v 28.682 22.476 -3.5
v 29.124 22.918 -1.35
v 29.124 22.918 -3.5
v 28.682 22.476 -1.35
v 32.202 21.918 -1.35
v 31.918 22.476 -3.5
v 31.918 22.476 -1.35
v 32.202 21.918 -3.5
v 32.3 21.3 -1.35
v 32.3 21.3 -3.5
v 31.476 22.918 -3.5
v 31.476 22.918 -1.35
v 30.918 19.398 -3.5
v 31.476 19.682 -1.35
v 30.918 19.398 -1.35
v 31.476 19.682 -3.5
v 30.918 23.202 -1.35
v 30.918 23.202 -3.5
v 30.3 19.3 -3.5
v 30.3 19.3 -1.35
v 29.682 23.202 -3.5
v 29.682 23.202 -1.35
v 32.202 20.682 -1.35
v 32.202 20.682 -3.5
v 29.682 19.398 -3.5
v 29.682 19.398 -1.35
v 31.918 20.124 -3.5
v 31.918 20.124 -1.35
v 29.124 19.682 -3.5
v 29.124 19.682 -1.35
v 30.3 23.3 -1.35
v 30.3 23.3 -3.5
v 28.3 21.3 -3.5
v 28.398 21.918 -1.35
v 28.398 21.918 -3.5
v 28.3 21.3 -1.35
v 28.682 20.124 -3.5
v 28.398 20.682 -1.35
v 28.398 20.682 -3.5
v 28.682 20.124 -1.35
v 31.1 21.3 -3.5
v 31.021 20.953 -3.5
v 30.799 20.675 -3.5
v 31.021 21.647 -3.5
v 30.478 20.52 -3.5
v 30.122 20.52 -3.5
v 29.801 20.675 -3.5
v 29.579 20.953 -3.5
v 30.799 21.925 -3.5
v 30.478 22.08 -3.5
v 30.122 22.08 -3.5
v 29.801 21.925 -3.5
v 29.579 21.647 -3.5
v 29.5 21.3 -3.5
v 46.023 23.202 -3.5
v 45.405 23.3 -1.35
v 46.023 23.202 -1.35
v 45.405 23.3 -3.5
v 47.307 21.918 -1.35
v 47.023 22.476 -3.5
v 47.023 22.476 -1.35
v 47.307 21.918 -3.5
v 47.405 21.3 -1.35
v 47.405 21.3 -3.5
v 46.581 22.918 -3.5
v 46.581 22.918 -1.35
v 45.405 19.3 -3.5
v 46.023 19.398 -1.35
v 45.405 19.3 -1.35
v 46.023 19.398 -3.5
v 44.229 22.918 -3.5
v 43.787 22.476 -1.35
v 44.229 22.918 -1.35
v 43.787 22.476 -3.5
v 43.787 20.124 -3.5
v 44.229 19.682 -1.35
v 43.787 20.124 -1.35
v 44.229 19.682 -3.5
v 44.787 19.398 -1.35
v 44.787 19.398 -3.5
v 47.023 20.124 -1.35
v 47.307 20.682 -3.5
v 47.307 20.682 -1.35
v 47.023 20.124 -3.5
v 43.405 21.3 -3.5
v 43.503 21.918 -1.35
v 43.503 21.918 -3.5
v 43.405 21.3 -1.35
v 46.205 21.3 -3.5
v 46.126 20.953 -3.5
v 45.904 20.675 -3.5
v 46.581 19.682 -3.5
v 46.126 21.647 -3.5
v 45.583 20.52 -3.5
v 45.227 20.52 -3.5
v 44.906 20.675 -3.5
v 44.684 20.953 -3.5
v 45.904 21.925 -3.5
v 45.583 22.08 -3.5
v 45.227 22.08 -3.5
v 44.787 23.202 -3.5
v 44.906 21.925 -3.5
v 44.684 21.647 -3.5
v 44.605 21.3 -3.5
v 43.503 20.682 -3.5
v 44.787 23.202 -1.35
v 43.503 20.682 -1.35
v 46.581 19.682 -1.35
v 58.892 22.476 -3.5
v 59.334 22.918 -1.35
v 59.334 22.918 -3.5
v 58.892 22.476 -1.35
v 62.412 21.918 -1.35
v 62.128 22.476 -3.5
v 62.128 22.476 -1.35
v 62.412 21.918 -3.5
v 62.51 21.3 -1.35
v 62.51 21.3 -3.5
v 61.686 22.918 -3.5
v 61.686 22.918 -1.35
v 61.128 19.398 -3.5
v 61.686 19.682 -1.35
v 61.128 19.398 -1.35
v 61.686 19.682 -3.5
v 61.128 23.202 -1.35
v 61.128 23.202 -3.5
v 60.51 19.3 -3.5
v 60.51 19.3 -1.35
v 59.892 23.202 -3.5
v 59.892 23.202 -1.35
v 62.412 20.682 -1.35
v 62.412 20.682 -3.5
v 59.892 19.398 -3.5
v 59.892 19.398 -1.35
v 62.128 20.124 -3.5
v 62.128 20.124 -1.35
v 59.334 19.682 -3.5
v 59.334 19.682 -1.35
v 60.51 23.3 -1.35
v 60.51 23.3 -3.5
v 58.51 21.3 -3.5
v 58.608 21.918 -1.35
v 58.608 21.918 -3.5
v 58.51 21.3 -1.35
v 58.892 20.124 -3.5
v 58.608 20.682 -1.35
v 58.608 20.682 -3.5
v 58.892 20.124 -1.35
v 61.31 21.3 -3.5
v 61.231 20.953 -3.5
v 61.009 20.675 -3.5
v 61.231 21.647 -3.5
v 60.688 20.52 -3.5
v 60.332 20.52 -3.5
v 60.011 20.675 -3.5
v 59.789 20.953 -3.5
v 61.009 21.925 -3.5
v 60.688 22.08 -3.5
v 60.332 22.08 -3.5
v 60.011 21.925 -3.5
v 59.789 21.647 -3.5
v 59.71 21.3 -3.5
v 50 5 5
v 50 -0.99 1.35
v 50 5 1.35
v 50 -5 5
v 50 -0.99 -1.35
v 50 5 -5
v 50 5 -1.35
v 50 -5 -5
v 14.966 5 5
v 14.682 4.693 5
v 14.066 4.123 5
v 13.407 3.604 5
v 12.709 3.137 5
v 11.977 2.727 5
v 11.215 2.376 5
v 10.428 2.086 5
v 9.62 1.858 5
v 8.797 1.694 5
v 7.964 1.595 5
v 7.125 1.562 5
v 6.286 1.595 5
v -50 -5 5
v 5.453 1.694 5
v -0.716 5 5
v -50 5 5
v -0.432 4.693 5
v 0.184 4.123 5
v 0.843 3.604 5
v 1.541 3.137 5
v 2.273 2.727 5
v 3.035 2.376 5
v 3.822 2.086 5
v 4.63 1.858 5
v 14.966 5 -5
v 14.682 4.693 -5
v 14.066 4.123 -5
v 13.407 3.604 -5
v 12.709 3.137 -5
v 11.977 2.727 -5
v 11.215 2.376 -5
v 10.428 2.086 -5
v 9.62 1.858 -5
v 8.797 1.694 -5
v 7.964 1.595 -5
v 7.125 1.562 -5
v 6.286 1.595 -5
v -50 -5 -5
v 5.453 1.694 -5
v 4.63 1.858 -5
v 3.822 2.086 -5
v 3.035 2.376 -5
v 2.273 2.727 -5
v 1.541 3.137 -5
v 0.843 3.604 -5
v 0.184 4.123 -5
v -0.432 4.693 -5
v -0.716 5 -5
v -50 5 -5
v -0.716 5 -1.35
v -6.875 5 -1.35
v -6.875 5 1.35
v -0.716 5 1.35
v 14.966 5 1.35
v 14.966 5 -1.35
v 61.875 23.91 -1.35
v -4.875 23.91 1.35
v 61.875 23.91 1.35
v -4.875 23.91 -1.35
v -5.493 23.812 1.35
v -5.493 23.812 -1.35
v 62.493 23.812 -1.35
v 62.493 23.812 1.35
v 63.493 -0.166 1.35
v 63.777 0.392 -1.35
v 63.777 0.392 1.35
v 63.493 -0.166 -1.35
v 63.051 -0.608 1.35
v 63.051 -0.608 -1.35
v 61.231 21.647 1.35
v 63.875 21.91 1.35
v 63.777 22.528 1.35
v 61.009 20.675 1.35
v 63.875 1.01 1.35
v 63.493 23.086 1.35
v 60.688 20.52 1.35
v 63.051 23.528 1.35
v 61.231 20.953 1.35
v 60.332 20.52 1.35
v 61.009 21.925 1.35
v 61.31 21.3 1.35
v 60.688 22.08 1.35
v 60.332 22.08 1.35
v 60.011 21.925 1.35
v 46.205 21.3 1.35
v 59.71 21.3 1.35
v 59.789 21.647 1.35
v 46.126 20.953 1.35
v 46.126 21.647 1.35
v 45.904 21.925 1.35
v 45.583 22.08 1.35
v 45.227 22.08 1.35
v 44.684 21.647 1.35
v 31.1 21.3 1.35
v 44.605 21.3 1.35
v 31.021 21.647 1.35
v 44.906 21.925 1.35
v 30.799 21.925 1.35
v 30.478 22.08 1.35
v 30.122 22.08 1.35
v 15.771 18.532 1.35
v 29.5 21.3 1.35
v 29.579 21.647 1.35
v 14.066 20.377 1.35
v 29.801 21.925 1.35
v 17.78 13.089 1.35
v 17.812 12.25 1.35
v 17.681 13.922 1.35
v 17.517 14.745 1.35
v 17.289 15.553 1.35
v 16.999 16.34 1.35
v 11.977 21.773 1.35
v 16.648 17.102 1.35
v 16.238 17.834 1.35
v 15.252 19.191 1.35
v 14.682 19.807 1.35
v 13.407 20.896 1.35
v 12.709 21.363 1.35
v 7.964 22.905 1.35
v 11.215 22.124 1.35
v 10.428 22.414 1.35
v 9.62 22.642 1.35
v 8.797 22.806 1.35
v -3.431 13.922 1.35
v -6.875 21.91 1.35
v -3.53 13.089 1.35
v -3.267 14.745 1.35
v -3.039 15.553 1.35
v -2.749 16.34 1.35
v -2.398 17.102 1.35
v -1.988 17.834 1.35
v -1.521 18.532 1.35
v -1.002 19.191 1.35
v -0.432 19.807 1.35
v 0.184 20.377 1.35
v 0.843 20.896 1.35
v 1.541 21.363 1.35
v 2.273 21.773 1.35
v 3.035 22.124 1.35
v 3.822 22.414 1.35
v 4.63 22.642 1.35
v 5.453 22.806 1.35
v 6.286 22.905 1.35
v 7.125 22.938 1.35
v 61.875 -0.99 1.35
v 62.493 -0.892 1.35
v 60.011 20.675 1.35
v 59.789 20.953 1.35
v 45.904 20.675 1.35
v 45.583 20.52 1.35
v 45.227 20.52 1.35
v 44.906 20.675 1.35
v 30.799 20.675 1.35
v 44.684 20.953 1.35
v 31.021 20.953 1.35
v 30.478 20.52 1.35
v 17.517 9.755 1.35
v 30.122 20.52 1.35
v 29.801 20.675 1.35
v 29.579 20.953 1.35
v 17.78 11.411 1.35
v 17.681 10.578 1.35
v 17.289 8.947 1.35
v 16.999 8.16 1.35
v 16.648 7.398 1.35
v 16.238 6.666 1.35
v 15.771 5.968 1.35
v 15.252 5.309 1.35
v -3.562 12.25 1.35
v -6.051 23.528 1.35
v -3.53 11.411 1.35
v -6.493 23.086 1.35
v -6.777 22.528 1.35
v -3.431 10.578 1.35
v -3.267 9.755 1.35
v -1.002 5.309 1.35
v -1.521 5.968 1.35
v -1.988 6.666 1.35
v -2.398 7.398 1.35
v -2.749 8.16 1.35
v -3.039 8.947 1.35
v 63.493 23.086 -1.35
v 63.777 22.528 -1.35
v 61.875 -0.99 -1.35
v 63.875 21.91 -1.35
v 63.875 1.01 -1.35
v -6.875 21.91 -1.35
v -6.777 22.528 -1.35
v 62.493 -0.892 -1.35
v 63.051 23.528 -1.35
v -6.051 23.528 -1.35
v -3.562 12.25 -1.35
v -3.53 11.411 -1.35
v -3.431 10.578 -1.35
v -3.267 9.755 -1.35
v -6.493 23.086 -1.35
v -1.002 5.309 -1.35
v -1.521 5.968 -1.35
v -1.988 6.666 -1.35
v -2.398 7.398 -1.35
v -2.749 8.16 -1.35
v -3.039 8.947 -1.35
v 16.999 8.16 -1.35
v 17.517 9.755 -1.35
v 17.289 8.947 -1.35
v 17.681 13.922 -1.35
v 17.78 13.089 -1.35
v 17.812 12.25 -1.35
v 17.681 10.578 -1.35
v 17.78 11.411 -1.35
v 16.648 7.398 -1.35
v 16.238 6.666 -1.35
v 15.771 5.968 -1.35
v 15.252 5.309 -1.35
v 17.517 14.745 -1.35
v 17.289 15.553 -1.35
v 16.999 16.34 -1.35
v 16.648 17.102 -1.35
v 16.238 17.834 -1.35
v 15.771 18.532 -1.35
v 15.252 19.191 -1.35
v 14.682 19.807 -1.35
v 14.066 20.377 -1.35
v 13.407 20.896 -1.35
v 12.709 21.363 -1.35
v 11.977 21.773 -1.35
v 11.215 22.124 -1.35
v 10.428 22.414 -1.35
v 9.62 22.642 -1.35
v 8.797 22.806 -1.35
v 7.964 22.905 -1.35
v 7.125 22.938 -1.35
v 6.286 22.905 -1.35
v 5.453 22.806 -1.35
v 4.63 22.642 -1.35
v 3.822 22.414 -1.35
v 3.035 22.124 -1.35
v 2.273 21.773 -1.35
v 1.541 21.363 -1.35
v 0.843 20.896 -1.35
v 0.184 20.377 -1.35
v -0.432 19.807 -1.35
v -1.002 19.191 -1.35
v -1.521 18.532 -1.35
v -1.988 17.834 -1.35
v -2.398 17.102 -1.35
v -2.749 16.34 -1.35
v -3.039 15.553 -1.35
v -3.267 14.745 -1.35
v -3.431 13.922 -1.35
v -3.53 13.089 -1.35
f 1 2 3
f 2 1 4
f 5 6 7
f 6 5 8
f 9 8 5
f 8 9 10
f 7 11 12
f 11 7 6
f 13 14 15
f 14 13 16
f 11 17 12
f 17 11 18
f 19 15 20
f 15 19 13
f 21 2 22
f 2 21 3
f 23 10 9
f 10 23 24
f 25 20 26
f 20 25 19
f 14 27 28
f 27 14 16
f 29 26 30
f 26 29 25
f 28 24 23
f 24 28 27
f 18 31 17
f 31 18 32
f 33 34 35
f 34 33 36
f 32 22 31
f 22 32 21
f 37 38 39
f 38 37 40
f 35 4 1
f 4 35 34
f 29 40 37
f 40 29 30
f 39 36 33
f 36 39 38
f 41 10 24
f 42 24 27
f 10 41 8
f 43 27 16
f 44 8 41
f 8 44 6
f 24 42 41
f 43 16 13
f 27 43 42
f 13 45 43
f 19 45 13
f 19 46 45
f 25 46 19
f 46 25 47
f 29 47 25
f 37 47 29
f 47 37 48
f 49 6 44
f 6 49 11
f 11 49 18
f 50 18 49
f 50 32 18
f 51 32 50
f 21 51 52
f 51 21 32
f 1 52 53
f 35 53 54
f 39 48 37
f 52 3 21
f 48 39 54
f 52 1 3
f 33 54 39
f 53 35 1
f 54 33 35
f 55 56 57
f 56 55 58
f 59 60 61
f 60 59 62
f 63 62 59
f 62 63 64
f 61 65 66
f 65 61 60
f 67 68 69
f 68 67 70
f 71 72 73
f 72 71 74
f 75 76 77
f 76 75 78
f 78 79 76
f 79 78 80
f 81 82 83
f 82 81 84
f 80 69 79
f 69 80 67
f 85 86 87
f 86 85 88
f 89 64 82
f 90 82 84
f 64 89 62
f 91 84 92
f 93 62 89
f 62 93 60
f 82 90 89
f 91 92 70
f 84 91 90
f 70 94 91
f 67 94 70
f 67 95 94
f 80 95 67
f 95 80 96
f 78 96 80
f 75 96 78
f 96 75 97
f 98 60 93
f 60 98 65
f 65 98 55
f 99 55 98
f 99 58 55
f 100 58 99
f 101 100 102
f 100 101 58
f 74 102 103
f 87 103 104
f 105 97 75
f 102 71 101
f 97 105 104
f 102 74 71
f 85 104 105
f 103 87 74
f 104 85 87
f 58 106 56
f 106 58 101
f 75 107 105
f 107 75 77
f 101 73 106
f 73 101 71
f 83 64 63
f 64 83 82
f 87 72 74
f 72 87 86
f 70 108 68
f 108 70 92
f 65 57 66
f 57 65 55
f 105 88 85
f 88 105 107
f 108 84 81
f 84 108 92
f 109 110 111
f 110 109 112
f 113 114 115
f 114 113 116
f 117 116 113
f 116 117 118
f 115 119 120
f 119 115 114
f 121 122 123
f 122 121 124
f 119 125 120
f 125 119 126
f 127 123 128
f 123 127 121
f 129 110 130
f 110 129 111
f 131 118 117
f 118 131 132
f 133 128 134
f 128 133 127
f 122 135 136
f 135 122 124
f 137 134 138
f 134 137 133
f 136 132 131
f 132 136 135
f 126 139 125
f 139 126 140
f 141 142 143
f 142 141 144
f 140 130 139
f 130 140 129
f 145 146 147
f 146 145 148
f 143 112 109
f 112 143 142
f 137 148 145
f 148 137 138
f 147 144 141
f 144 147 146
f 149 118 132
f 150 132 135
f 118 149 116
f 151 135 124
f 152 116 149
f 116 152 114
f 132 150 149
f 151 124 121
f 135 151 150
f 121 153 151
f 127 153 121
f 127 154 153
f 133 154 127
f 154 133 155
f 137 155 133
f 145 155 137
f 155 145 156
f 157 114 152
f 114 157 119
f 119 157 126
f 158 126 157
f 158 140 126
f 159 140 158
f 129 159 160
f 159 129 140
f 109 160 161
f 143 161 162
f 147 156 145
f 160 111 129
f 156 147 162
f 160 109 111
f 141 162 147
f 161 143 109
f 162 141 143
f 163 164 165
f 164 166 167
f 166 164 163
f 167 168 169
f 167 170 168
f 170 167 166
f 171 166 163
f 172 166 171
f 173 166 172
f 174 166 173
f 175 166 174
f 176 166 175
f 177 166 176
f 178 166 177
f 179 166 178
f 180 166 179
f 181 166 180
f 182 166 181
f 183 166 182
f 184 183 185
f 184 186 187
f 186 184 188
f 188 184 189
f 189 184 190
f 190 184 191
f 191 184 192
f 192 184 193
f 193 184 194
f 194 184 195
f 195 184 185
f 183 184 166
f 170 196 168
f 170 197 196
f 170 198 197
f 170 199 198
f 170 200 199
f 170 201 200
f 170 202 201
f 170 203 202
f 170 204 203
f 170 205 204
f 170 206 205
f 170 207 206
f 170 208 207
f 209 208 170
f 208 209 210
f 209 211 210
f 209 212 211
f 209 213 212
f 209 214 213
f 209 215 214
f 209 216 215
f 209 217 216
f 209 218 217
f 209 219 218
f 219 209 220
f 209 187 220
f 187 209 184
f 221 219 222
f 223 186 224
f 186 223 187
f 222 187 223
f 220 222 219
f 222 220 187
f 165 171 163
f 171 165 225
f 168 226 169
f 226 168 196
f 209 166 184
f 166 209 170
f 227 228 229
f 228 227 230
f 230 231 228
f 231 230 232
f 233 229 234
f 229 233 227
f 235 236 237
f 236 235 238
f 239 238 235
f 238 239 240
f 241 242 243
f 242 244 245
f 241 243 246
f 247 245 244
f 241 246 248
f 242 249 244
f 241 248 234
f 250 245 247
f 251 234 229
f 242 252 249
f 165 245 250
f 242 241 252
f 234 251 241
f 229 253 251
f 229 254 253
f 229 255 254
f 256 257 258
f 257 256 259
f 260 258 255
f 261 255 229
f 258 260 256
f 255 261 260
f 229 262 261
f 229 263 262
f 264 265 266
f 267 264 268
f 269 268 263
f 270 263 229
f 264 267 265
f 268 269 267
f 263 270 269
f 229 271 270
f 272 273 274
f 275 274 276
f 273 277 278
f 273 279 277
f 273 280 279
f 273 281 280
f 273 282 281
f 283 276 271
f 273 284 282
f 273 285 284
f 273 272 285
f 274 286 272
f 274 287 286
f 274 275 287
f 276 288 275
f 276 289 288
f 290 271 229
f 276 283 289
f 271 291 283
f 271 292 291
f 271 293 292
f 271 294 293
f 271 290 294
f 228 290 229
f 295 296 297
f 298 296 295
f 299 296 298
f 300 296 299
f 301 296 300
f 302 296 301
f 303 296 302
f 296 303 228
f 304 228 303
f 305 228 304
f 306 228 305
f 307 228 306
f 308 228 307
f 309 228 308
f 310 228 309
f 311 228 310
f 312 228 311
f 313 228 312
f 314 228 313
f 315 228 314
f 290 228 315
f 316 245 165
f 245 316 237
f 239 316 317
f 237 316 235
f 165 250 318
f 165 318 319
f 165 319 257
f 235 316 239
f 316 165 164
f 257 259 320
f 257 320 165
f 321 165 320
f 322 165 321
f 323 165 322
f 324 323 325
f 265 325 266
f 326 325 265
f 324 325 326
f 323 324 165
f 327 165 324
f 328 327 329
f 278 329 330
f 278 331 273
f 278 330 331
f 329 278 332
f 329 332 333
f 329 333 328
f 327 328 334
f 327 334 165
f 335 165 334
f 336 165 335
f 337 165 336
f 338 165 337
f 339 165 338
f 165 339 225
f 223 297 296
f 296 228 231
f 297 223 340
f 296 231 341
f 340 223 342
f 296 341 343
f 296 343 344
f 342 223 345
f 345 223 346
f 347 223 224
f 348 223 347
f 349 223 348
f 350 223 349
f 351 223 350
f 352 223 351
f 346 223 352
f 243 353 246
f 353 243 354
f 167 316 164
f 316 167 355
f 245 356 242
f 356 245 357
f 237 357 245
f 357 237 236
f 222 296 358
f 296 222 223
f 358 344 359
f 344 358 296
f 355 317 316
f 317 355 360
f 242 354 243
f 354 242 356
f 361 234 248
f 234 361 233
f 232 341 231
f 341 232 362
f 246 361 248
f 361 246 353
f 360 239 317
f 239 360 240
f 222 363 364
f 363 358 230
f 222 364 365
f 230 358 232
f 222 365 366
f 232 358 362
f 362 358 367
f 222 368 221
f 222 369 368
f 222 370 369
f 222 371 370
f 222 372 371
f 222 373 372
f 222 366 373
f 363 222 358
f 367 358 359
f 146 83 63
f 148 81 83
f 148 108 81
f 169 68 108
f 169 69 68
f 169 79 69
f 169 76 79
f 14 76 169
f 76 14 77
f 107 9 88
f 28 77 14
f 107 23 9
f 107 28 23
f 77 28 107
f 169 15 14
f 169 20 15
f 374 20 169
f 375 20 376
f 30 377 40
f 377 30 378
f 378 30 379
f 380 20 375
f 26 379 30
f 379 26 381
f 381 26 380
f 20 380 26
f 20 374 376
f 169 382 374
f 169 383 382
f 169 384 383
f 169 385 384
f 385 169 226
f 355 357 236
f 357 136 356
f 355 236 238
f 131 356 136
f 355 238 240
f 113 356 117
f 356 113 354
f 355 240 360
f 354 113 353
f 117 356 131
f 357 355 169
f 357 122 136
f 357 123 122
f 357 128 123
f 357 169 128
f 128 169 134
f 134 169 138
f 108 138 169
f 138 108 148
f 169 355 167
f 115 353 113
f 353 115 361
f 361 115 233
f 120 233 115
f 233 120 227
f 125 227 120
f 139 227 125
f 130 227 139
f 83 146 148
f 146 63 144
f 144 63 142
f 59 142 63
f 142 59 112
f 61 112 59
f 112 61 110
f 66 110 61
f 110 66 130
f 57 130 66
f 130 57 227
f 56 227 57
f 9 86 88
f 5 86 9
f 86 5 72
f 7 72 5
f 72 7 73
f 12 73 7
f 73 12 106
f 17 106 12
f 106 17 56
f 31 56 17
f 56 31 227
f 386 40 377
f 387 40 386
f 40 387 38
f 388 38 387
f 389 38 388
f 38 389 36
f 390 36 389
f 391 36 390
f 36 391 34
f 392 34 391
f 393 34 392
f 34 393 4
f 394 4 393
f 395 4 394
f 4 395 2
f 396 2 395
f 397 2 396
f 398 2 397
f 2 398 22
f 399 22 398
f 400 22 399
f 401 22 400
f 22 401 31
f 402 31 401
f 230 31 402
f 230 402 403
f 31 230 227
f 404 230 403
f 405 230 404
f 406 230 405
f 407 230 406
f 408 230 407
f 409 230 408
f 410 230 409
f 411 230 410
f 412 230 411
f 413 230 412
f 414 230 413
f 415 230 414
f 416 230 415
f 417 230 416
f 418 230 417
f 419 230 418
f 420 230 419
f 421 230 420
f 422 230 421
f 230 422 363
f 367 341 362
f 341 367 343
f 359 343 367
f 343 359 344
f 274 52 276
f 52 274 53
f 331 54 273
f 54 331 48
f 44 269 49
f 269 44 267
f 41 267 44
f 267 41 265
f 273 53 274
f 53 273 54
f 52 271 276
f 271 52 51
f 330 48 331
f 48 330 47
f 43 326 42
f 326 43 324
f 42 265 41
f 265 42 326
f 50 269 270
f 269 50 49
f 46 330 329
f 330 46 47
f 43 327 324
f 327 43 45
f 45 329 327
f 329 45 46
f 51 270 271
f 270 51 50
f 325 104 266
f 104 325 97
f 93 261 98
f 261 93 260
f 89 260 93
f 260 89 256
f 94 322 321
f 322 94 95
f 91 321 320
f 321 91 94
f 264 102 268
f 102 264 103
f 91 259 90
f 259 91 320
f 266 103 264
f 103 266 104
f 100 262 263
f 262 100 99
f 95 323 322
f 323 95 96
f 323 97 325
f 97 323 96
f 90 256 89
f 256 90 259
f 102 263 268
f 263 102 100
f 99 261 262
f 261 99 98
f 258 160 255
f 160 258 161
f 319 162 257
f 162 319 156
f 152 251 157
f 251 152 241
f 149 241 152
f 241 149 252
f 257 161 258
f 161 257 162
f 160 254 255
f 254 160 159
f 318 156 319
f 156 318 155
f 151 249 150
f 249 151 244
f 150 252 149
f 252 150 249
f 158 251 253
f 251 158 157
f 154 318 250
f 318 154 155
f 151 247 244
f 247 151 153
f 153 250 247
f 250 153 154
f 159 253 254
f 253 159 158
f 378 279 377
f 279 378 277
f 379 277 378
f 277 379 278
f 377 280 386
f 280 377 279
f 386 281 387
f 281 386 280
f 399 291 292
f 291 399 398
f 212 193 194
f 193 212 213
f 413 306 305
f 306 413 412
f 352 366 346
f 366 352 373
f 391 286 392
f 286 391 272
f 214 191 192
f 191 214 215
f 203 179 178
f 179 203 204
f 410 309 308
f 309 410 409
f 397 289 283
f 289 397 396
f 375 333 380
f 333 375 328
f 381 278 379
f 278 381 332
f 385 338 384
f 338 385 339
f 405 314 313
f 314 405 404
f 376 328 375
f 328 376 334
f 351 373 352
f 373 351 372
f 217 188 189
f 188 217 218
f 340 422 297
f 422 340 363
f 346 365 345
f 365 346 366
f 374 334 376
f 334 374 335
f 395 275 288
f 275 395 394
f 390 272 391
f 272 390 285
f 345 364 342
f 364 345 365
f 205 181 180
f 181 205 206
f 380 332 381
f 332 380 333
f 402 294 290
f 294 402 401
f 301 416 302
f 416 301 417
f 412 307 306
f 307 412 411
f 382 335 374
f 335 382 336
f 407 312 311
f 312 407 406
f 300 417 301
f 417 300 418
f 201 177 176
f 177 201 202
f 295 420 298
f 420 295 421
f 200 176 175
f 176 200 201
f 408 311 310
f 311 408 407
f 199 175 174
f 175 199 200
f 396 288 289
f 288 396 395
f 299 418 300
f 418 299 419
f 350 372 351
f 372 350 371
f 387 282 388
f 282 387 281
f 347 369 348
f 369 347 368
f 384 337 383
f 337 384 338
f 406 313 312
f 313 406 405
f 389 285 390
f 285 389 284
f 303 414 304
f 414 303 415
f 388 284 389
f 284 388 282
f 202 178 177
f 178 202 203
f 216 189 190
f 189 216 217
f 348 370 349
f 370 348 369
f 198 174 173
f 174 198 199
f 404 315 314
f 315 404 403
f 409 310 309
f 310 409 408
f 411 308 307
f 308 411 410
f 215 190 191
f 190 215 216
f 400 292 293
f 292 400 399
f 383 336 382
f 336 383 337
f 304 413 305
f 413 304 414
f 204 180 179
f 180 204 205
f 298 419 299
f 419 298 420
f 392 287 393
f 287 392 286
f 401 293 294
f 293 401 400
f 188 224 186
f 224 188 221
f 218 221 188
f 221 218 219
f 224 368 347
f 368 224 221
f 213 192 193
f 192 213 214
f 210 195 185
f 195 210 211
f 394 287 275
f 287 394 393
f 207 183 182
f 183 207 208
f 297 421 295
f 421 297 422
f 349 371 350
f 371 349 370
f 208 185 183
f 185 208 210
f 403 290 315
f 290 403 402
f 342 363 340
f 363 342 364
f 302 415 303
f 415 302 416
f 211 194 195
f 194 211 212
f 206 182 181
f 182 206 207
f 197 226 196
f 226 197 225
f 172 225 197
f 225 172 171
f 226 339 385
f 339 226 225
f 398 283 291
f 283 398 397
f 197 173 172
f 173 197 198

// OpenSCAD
// collection of parts for the new picker idea

airflow = 57;
sleeveout = airflow+1;

// [fullOD, shaftD, thickness, turning_hubD]
hubbearing = [22,8,7,13];
travelbearing = [6,3,2.5,5];
travelwheel = 60;
travelpeg = travelwheel - travelbearing[1];

fat     = 0.3;  // add-on to make walls cut out enough space
hb      = 12.7 + fat; // height of bar cross-section
wthk    = 1.5 + fat;  // thickness of walls
flrthk  = 1.6 + fat;  // thickness of floor (that walls extend from)
inside  = 6.9 - fat;  // between walls, across floor (subtracting 2*.5*fat)
c_bar = [[0,0], [0,hb], [wthk, hb], [wthk, flrthk], [wthk+inside, flrthk], [wthk+inside, hb], [wthk+inside+wthk, hb], [wthk+inside+wthk, 0]];

//#shaft(travelbearing);
//#cbar(barH=100);
//#can_sleeve();
//translate([50,50,0])
//    for (i=[0:3:360]){
//        nutbolt(nut_position=20*i/360, channel_ang=i);
//    }
//bigwheel_part();
// bartest();

// ** the can traveler by itself ***
//rotate([0,0,180]) translate([0, -56, +25.9])
    //upndown();    

//motorcut();
//cbar();

rackpush();

// ** the main picker body ** 
//cbracket();

// ** the valve parts **
//louvers();

//plate_air_parts();
           

// for cutting out shaft and hub-turning space
module shaft(bearing, xtraH=0, hubclearance=0.5){
    height=bearing[2] + xtraH;
    translate([0,0,-height/2-hubclearance/2])
        cylinder(r=bearing[3]/2, h=hubclearance, center=true, $fn=28);
    translate([0,0,0])
        cylinder(r=bearing[1]/2, h=height, center=true, $fn=24);
    translate([0,0,height/2+hubclearance/2])
        cylinder(r=bearing[3]/2, h=hubclearance, center=true, $fn=28);
    echo("shaft of bearing = ", bearing, "is top-to-bottom = ", hubclearance*2 + height);
} 

// alluminum c-channel, positive or negative
module cbar(outline=c_bar, barH=50){
    midbar = outline[7][0] / 2;
    echo("midbar read as: ",midbar);
    translate([-midbar,0,0])
    linear_extrude(center=true, height=barH, convexity=10, slices=2)
        polygon(points=outline);
}

// intended as positive model, could add scale or thickness
module can_sleeve (emptyness=airflow, thickness=sleeveout-airflow-0.2, sleeveH=25){
    translate([0,0,-sleeveH/2])
        rotate_extrude($fn=196)
            translate([(emptyness+thickness) / 2, 0, 0])
                polygon(points=[[0,0], [0,sleeveH], [thickness,sleeveH], [thickness,0]]);
}

// negative model with channel for captured nut insertion
module nutbolt(hexhead=6.65, 
                shaftD=3.1, 
                shaftlen=20, 
                nut_position=17,
                nut_thick=2.33,  
                channel_len=30, 
                channel_ang=0,){
    color( .5, .9, .9 )
    translate([0,0,-shaftlen/2]){  //center it by shaftlen
        //shaft
        cylinder(r=shaftD/2, h=shaftlen, center=false, $fn=18);
        //head
        #translate([0,0,shaftlen-hexhead/2])
        cylinder(r=hexhead/2, h=hexhead/2, center=false, $fn=6);
        //nut + channel
        translate([0,0,shaftlen-nut_position])
        hull(){
        rotate([0,0,channel_ang])
            cylinder(r=hexhead/2+.1, h=nut_thick+.1, center=false, $fn=6);
        translate([cos(channel_ang)*channel_len, 
                    sin(channel_ang)*channel_len, 0])
            rotate([0,0,channel_ang])
                cylinder(r=hexhead/2+.2, h=nut_thick+.1, center=false, $fn=6);
        }
    }
}

module motorhub(flat_to_flat=4.76, diameter=7.4, height=5.57, baseD=9, baseH=1.0){
    cutrad = (diameter - flat_to_flat)/2;
    cutcenter = flat_to_flat/2 + cutrad;
    cylinder(r=baseD/2, h=baseH+0.1, center=false, $fn=36);
    cylinder(r=0.8, h=baseH+5*height+.1, center=true, $fn=6);
    translate([0,0,baseH])
        difference(){
            cylinder(r=diameter/2, h=height+baseH, center=false, $fn=24);
            for (i=[cutcenter+0.05, -cutcenter-0.05]){
                translate([0,i,(height+baseH)/2])
                    cube([diameter+0.1, cutrad+0.1, height+.1], center=true);
            }

        }
}
    
module bigwheel_part(od=travelwheel, thk=4, hub=12, hubthk=4, holes=6, lever=5){
    overall_thk = thk+hubthk;
    echo("overall bigwheel thickness is : ", overall_thk);
    difference(){
        union(){
            cylinder(r=od/2, h=thk, $fn=196);
            translate([0,0,4])
            cylinder(r=hub/2, h=hubthk, $fn=64);
        }
        translate([0,0,overall_thk+0.05]) rotate([180,0,0])
            motorhub();
        for (i=[0 : 360/holes : 360-(360/holes)*.5]){
            translate([od/3.14*cos(i), od/3.14*sin(i), hubthk/2])
                cylinder(r=od*.5/(holes-1), h=hubthk+.1, center=true, $fn=42);
        }
        translate([0,od/2-lever,-9]) rotate([0,0,0])
            nutbolt();
        translate([0,-od/2+lever,-9]) rotate([0,0,0])
            nutbolt();
    }
}

module ring(ID, OD, ht){
    difference(){
        cylinder(r=OD/2, h=ht, center=true, $fn=96);
        cylinder(r=ID/2, h=ht+.1, center=true, $fn=96);
    }
}

// for LMB8MM
module bearingcut(D=15.1/2, dring=14.41/2, drod=8.9/2, dziptie=[19,3.3],){
    rotate_extrude(center=true, convexity=10, $fn=36){
        polygon(points=[[0,-2], [D,0], 
                        [D,3.3], [dring,3.3], 
                        [dring,4.55], [D,4.55], 
                        [D,19.35], [dring,19.35], 
                        [dring,20.8], [D,20.8], 
                        [D, 24.01], [0,26.01]]);
    }
    // zip tie rings
    for (i=[(3.3+4.55)/2, (19.35+20.8)/2]){
        translate([0,0,i])
            ring(dziptie[0], dziptie[0]+dziptie[1], 5);
    }
    // rod upon which it travels
    translate([0,0,12])
        cylinder(r=drod, h=90, $fn=18, center=true);
}

module bigwheel_cutout(od=travelwheel+3, thk=10){
    cylinder(r=od/2, h=thk, $fn=128);
}

module bartest(ht=10){
    difference(){
    minkowski(){
        cube([20,20,10], center=true);
        cylinder(r=4, h=.1, center=true, $fn=24);
    }
    translate([-7,-9,0])
        #cbar(barH=30);
    translate([17,0,0]) rotate([0,0,90])
        #cbar(barH=30);
    translate([0,10.5,0]) rotate([90,0,0])
        #shaft(hubbearing);
    }
}

module upndown(ht=travelwheel){
    difference(){
    cube([travelwheel, travelwheel/2, ht], center=true);
    // lift rail
    translate([0, travelwheel/2-hb, 0])
        cube([travelwheel+.1, hb+.1, c_bar[6][0]+.1], center=true);
    // side rails
    translate([-travelwheel/2+.5 ,3.25, 0]) rotate([0,0,-0])
        cube([hb+.5, c_bar[6][0]+1, travelwheel+.1], center=true);
    translate([travelwheel/2-.5 ,3.25, 0]) rotate([0,0,0])
        cube([hb+.5, c_bar[6][0]+1, travelwheel+.1], center=true);

    // cylinder space
    translate([0, -travelwheel/2, 0])
        cylinder(r = (sleeveout+.5)/2, h=ht+.1, $fn=196, center=true);
    // nuts
    translate([0,0,ht/4]) rotate([90,0,0])
        #nutbolt(channel_ang=90);
    translate([0,0,-ht/4]) rotate([90,0,0])
        #nutbolt(channel_ang=-90);
    }
    // underside printing supports for lift rail
    for (i=[0:5:travelwheel-1]){
        translate([i - travelwheel/2+2.5, travelwheel/2-hb*1.333, 0])
            cube([.5, hb*.37, c_bar[6][0]+.1], center=true);
    }
}

module upndown_cutout(ht=travelwheel){
    translate([0,-4.5,0])
    cube([travelwheel+1, travelwheel/2+9.5, ht+2], center=true);
    // lift rail
    //translate([0, travelwheel/2+hb, 0])
    //    cube([travelwheel+.1, hb+.1, c_bar[6][0]+.1], center=true);
    // side rails
    translate([-travelwheel/2+hb/2+.2,-5, 0]) rotate([0,0,90])
        cbar(barH=70);
    translate([travelwheel/2-hb/2-.2,-5, 0]) rotate([0,0,-90])
        cbar(barH=70);
    // cylinder of suckage
    translate([0, -travelwheel/2 -9.5, 0])
        cylinder(r = (sleeveout+2)/2, h=ht+2, $fn=196, center=true);

}

module motorcut(x=23,y=22,z=37,tab=[6,4,5],tabpos=7,curverad=5, shaftpos=[0,11,16], canheight=28){
    tiptop = canheight + z + tab[2] - curverad;
    // top-motorhousing
    translate([0,y/2, tiptop - canheight])
        cylinder(r=x/2, h=canheight, center=false, $fn=36);
    // gearbox housing
    translate([-(x-curverad*2)/2, 0, curverad+tab[2]])
        minkowski(){
            cube([x-curverad*2,y,z-curverad*2], center=false);
            rotate([90,0,0])
                cylinder(r=curverad, h=.1, center=false, $fn=64);
        }
    // tab thingy for motor attachment
    translate([0,tabpos+tab[1]/2, tab[2]/2]){
        cube(tab, center=true);
        // cuts hole for bolting tab
        rotate([90,0,0])
            cylinder(r=3.26/2, h=50, center=true, $fn=12);
    }
    // driven hub stub and slide-in track
    translate(shaftpos)
        rotate([90,0,0])
            hull(){
            cylinder(r=9.14/2, h=y+4, center=true, $fn=18);
            translate([0,z-shaftpos[0], 0])
                cylinder(r=9.14/2, h=y+4, center=true, $fn=18);
            }
    // cuts shaft for holes that penetrate housing
    for (i=[1,-1]){
    translate([17.75/2 * i, 0, 36])
        rotate([90,0,0])
            cylinder(r=3.26/2, h=50, center=true, $fn=12);
    }
    // add on the driven wheel
    translate(shaftpos)
        rotate([90, 0,0]) translate([0,0,-y]){
            bigwheel_cutout();
            // and its connection hub
            translate([0,0,+3])
            hull(){
                cylinder(r=8, h=15, $fn=16, center=false);
                translate([0,z-shaftpos[0], 0])
                cylinder(r=8, h=15, $fn=16, center=false);
            }
        }
    // make a cut-out for the traveling part
    rotate([0,0,180]) translate(shaftpos) translate([0,-59,0])
    upndown_cutout();
}


// carve the big thing out of a block        
module cbracket(z=travelwheel/2, bs=1.5){
    difference(){
        translate([-travelwheel/2, 0, -4])
        minkowski(){
            cube([travelwheel, travelwheel*1.2, travelwheel-17], center=false);
            cylinder(r=8, h=1, $fn=16);
        }
    motorcut();
    translate([-travelwheel/2-bs, -bs, 4]) 
    bearingcut();
    translate([travelwheel/2+bs,-bs, 4])
    bearingcut();
    translate([z+2.5,z*2.5+.5,z*1.3]) rotate([0,0,0])
        #nutbolt(channel_ang=45);
    translate([-z-2.5,z*2.5+.5,z*1.3]) rotate([0,0,0])
        #nutbolt(channel_ang=135);
    translate([-z*.8, z*.5,z*1.23]) rotate([0,0,0])
        #nutbolt(channel_ang=180);
    translate([z*.8, z*.5,z*1.23]) rotate([0,0,0])
        #nutbolt(channel_ang=0);
    }
}
////-----------------------------////
//// *** air valve section  **** ////
//// ____________________________////

flapquant=4;
openingside=airflow/flapquant;
flapthick = 5;
buttonht = 4;
gap = 1.8; // between walls

flap = [[0,0], [flapthick,openingside], [flapthick,0], [0,-openingside]];

module pie(arc=90, center=90, rad=11, height=3){
    rotate([0,0,center-arc/2])
     difference(){
        children();
        translate([0,-rad, 0])
            cube([rad*2,rad*2,rad*2], center=true);
        rotate([0,0,arc])
        translate([0,rad, 0])
            cube([rad*2,rad*2,rad*2], center=true);
    }
}

module degreed(sect=90, mks=60, size=15){
    for (i=[0:sect/mks:sect-1]){
        translate([cos(i)*size, sin(i)*size, 3])
            color([.9, i/sect*2+.5,0,1])
                cylinder(r=sect/mks/4, h=6, $fn=12, center=true);
    }
}

module one_love(scaler=1){
    // one flap with key holes  
    difference(){
        translate([-flapthick/2, 0, 0])
            linear_extrude(height=airflow){
                polygon(points=flap);
            }
    translate([0,0, airflow/2]) rotate([0,0,-10.1])
        scale([scaler,scaler,1]){
            cube([flapthick/2.8, openingside/1.5, airflow+.1], center=true);
        cylinder(r=1.65, h=airflow+.1, $fn=16, center=true);
        }
    }
}

module carabas(wheelrad=openingside/2, leverscale=1){
    // its the place for louvers
    wheel = max(wheelrad, 3);
    translate([0,0,-gap/2- buttonht/2])
        cylinder(r=wheel+.1, h= gap/2, $fn=24, center=false);
    difference(){
        cylinder(r1=wheel, r2=wheel-3, h=buttonht, $fn=196, center=true);
        scale([1.07,1.07,1]) 
            one_love(scaler=0.85);
        cylinder(r=1.7, h=4.1, $fn=16, center=true);
    }
    translate([-wheel+(openingside/2+1.5)/4, 0, -buttonht/2 - gap/2])
        lever(lvrad= openingside/2 +1.5, lvthk=gap/2, lvscale=leverscale);
}

module lever(lvrad=openingside/2 + 1.5, lvthk=gap/2, lvscale=1){
    difference(){
        union(){
            hull(){
                cylinder(r=(lvrad + 1.5)/4, h=lvthk, center=false, $fn=16);
                translate([0,9/lvscale,0])
                    cylinder(r=(lvrad + 1.5)/4, h=lvthk, center=false, $fn=16);
            }
            translate([0,9/lvscale,0])
                cylinder(r=2, h=lvthk*2 + 0.25, center=false, $fn=16);
        }
        if (lvscale < 1.001){
            translate([0,9/lvscale,-0.05])
                cylinder(r=1.65, h=lvthk*2 + 0.25 + 0.1, center=false, $fn=6);
        }
    }
}

module louvers(){
    // the flaps- working well standing up
    for (i=[0:flapquant-2]){
        translate([i*openingside, 0, 0]) rotate([0,0,75])
        one_love();    
        translate([i*(openingside+.5)+5,-openingside*2.8 ,buttonht/2+gap/2]){
            carabas();
            //translate([0, 0, -buttonht/2 - gap/2])
            //    lever();
           mirror([0,1,0]) //{
            translate([-openingside*0.4, -openingside*1.8, 0]) 
                carabas();
           // translate([0, openingside*1.2, - buttonht/2- gap/2])
           //     lever();}
        }     
    } 
    //translate([airflow/2-openingside,openingside,airflow/2]) rotate([90,0,0])
     //   #circle(r=30, $fn=128, center=true);
}

module side_plate(sidethick=2, insider=1, scalecut=1.07){
    // laying on its... side 
    difference(){
    translate([airflow - openingside*(flapquant-1), 0, buttonht/4])
        union(){
        cube([airflow, openingside*2 + 1, buttonht/2], center=true);
            for (i=[1,-1]){
                translate([i * (airflow/2+sidethick/2), 0,0]) rotate([0,-i*90,0])
                notcher();
            }
        }
        
        if (insider==1){
            echo("flapquant =",flapquant);   
            for (i=[0:flapquant-2]){ 
                echo("i*openingside = ",i*openingside);  
                translate([i*openingside*1.06, 0, buttonht/2+0.05]){ 
                    scale([scalecut,scalecut,scalecut])
                       rotate([0,0,-81])
                       carabas(leverscale=scalecut);
                    translate([0,0,-buttonht/2])
                    pie(arc=109, center=95, rad=13.6, height=4){
                       rotate_extrude(convexity=10, $fn=36){
                       translate([11/scalecut, 0, 0])
                          square([4.2,2.5], center=true);
                       }
                    }
                }
            }
        }
    }
}

module notcher(cd=2.2, cz=6, clong=1){
    difference(){
        cube([cd, openingside*2, cz], center=true);
        translate([0,0,-clong/2-0.05])
            cube([cd+0.05, openingside*2-((cz-clong)*2), cz-clong], center=true);
    }
}
    
module end_plate(sidethick=2.2, ridge=1, cc=buttonht/2+0.2){
    xlen = airflow+sidethick*4+gap*4+ridge*2;
    translate([0,0,(sidethick+ridge)/2])
    difference(){
        cube([xlen, openingside*2 + 1, sidethick+ridge], center=true);
        translate([0,openingside/3, sidethick/2])
            cube([airflow+sidethick*4+gap*2, openingside/2-1, ridge+0.1], center=true);
        translate([0,-openingside/3, sidethick/2])
            cube([airflow+sidethick*4+gap*2, openingside/2-1, ridge+0.1], center=true);
        for (i=[1,-1], j=[cc, cc*3.5]){
        translate([i*(xlen/2-j),0, 0])
            scale([1.05,1.05,1.05])
                notcher(cd=cc, cz=6.75, clong=ridge);
        }
    }
}

module rackpush(camsize=openingside*2, travelspace=openingside+2.5, curv=2){
    difference(){
        union(){
		cube([100,10,10], center=true);
        translate([airflow / 2, (camsize - gap * 3.1) / 2,0])
            minkowski(){
                cube([camsize + airflow - travelspace - curv, openingside * 2 - gap*2-curv*2, gap-.1], center=true);
                cylinder(r=curv, $fn=20, center=true);
            }
            for (i=[0:flapquant-2]){ 
                translate([i*openingside*1.06+camsize+gap, openingside*2 - gap*4, -3.5/2])
                    cylinder(r=2, h = 3.5, $fn=20, center=true);
            }
        }
        for (i=[0:flapquant-2]){ 
            translate([i*openingside*1.06+camsize+gap, openingside*2-gap*4, (gap-.1)/2])
                cylinder(r=0.8, h = 10, $fn=14, center=true);
        }
		translate([openingside/2, openingside-curv,0])
			cylinder(r=openingside*1.5/2, h=15, center=true, $fn=80);
    }
}


module plate_air_parts(){
    // for printing the parts
    translate([33,52,0]) rotate([0,0,0])
        end_plate();
    mirror([ 1, 0, 0 ]) { 
    translate([33,22,0]) rotate([0,0,0])
         end_plate(); }

    translate([23.5,21,2]) rotate([180,0,0])   side_plate();
    mirror([ 1, 0, 0 ]) { 
    translate([23.5,52,2]) rotate([180,0,0])   side_plate(); }
    translate([-56,-12,0]) rotate([0,0,0]){
        side_plate(insider=0);
        mirror([ 1, 0, 0 ]) {
        translate([-113,-29,0]) rotate([0,0,90])
            side_plate(insider=0); }
    }
}
